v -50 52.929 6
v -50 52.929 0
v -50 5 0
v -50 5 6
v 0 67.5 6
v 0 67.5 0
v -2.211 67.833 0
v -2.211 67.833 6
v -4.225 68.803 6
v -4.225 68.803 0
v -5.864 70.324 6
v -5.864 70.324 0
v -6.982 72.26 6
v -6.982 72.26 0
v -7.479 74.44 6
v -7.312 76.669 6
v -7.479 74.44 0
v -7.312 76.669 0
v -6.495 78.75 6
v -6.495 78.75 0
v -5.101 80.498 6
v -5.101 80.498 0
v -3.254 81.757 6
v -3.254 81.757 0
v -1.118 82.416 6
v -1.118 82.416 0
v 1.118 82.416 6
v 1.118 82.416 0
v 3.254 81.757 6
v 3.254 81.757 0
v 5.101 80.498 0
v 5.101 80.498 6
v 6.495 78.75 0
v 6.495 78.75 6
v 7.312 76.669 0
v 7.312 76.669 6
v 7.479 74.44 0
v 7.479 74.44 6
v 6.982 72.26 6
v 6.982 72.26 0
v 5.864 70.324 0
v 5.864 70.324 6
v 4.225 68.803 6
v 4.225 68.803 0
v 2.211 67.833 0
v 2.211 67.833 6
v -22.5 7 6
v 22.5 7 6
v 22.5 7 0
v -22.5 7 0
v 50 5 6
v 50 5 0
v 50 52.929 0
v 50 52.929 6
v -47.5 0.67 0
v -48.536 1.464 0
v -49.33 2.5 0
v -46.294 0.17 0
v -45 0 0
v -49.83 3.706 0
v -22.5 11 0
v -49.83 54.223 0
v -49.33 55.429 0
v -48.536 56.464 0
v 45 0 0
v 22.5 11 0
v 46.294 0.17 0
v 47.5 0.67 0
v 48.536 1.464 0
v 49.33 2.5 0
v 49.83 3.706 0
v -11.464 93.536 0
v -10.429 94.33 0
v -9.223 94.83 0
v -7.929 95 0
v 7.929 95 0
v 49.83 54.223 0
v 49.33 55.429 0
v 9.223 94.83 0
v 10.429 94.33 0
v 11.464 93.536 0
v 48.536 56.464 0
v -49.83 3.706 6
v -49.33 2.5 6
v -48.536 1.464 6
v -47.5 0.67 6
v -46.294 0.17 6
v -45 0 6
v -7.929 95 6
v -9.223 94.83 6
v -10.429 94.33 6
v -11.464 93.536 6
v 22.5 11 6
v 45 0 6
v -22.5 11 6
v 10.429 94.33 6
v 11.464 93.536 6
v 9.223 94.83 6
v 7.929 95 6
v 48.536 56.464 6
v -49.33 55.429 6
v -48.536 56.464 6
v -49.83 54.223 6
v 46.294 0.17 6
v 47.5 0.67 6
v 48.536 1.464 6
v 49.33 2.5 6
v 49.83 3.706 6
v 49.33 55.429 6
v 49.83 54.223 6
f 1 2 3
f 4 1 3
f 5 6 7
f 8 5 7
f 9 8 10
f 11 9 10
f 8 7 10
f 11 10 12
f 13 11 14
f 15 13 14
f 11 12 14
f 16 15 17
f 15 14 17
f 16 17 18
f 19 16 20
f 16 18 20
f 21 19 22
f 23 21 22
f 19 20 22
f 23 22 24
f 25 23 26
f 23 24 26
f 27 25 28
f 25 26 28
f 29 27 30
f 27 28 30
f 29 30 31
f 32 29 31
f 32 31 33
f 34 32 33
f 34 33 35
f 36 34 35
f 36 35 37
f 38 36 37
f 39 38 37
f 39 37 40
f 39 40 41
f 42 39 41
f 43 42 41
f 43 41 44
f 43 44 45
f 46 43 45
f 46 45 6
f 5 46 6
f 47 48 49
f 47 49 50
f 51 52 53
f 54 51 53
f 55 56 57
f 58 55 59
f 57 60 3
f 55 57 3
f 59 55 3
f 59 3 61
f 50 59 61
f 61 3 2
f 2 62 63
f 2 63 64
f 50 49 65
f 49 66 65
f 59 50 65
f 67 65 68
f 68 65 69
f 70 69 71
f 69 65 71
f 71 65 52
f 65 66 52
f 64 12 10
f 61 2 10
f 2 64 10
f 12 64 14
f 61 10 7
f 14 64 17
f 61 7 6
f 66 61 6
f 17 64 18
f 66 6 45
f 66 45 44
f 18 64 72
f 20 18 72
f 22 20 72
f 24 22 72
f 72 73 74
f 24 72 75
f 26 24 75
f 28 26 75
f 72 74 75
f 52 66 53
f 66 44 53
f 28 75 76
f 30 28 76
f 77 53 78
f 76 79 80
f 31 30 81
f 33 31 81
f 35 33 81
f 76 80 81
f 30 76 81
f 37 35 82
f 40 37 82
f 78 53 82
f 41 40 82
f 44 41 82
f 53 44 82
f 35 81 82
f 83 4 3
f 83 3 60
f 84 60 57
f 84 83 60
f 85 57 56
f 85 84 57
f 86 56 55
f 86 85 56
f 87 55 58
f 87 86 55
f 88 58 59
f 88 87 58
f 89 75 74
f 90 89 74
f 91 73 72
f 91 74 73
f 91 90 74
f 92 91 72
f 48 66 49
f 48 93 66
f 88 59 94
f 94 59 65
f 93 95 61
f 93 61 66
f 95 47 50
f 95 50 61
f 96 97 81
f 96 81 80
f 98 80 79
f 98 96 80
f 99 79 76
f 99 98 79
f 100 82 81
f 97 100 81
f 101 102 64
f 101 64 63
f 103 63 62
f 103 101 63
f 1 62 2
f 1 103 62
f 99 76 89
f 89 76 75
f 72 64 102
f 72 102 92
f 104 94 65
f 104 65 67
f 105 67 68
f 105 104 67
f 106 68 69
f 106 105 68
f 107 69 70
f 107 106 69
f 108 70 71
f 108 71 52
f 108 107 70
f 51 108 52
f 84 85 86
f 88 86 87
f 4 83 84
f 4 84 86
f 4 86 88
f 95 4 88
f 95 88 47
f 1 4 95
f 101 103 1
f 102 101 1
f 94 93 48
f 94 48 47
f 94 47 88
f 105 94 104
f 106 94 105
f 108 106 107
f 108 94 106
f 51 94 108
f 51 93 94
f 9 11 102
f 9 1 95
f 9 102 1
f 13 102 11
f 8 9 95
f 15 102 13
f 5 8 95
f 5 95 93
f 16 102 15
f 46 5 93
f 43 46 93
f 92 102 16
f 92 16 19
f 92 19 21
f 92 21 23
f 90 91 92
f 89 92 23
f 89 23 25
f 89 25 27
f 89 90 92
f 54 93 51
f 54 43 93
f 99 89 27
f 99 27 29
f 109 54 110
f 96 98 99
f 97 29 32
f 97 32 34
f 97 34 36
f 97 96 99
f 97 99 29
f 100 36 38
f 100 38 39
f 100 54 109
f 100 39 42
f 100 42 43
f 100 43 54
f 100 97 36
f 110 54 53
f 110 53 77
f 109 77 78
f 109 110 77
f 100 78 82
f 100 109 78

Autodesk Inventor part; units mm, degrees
ref_plane "YZ Plane" through (0, 0, 0) normal (1, 0, 0) x (0, 1, 0)
ref_plane "XZ Plane" through (0, 0, 0) normal (0, 1, 0) x (-1, 0, 0)
sketch "Sketch1" plane through (0, 0, 0) normal (0, 0, 1) x (1, 0, 0)
  line L0 (-50, 0) -> (50, 0)
  line L1 (50, 0) -> (50, 55)
  line L2 (10, 95) -> (-10, 95)
  line L3 (-50, 55) -> (-50, 0)
  line L4 (-50, 55) -> (-10, 95)
  line L5 (50, 55) -> (10, 95)
  point P0 (0, 0)
  point P1 (50, 95)
  point P2 (-50, 95)
  point P3 (0, 0)
  dimension "d2" = 95
  dimension "d3" = 100
  dimension "d4" = 40
  dimension "d5" = 40
  dimension "d6" = 40
  dimension "d7" = 40
extrude "Plate1" add sketch "Sketch1" along normal blind 6
hole "Hole1" at (0, 75, 6) direction (0, 0, -1) diameter 15 depth 6 tip angle 118
fillet "Corner Round1" radius 5 6 edges at (-50, 0, 3) (50, 0, 3) (50, 55, 3) (10, 95, 3) (-10, 95, 3) (-50, 55, 3)
ref_plane "Work Plane1" through (0, 0, 6) normal (1, 0, 0) x (0, 0, -1)
sketch "Sketch2" plane through (-45, 0, 6) normal (0, 0, 1) x (1, 0, 0)
  circle A0 centre (45, 75) radius 7.5 projected
  line L0 (22.5, 11) -> (67.5, 11)
  line L1 (67.5, 11) -> (67.5, 7)
  line L2 (67.5, 7) -> (22.5, 7)
  line L3 (22.5, 7) -> (22.5, 11)
  point P0 (0, 0)
  dimension "d19" = 4
  dimension "d20" = 45
  dimension "d21" = 7
  dimension "d22" = 22.5
extrude "Cut1" cut sketch "Sketch2" against normal blind 6 contours L0 L1 L2 L3
equation "\"d16\" = Thickness"
equation "\"d23\" = Thickness"
equation "\"d5\" = d4"
equation "\"d6\" = d4"
equation "\"d7\" = d6"
equation "\"BendReliefWidth\" = Thickness"
equation "\"CornerReliefSize\" = 4 * Thickness"
equation "\"MinimumRemnant\" = 2 * Thickness"
equation "\"TransitionRadius\" = BendRadius"
equation "\"d8\" = BendRadius"
equation "\"JacobiRadiusSize\" = Thickness"
equation "\"GapSize\" = Thickness"
equation "\"Thickness\" = 6"
equation "\"BendRadius\" = 0.001"
properties part number "voetplaat poot" material "Steel, Mild"
